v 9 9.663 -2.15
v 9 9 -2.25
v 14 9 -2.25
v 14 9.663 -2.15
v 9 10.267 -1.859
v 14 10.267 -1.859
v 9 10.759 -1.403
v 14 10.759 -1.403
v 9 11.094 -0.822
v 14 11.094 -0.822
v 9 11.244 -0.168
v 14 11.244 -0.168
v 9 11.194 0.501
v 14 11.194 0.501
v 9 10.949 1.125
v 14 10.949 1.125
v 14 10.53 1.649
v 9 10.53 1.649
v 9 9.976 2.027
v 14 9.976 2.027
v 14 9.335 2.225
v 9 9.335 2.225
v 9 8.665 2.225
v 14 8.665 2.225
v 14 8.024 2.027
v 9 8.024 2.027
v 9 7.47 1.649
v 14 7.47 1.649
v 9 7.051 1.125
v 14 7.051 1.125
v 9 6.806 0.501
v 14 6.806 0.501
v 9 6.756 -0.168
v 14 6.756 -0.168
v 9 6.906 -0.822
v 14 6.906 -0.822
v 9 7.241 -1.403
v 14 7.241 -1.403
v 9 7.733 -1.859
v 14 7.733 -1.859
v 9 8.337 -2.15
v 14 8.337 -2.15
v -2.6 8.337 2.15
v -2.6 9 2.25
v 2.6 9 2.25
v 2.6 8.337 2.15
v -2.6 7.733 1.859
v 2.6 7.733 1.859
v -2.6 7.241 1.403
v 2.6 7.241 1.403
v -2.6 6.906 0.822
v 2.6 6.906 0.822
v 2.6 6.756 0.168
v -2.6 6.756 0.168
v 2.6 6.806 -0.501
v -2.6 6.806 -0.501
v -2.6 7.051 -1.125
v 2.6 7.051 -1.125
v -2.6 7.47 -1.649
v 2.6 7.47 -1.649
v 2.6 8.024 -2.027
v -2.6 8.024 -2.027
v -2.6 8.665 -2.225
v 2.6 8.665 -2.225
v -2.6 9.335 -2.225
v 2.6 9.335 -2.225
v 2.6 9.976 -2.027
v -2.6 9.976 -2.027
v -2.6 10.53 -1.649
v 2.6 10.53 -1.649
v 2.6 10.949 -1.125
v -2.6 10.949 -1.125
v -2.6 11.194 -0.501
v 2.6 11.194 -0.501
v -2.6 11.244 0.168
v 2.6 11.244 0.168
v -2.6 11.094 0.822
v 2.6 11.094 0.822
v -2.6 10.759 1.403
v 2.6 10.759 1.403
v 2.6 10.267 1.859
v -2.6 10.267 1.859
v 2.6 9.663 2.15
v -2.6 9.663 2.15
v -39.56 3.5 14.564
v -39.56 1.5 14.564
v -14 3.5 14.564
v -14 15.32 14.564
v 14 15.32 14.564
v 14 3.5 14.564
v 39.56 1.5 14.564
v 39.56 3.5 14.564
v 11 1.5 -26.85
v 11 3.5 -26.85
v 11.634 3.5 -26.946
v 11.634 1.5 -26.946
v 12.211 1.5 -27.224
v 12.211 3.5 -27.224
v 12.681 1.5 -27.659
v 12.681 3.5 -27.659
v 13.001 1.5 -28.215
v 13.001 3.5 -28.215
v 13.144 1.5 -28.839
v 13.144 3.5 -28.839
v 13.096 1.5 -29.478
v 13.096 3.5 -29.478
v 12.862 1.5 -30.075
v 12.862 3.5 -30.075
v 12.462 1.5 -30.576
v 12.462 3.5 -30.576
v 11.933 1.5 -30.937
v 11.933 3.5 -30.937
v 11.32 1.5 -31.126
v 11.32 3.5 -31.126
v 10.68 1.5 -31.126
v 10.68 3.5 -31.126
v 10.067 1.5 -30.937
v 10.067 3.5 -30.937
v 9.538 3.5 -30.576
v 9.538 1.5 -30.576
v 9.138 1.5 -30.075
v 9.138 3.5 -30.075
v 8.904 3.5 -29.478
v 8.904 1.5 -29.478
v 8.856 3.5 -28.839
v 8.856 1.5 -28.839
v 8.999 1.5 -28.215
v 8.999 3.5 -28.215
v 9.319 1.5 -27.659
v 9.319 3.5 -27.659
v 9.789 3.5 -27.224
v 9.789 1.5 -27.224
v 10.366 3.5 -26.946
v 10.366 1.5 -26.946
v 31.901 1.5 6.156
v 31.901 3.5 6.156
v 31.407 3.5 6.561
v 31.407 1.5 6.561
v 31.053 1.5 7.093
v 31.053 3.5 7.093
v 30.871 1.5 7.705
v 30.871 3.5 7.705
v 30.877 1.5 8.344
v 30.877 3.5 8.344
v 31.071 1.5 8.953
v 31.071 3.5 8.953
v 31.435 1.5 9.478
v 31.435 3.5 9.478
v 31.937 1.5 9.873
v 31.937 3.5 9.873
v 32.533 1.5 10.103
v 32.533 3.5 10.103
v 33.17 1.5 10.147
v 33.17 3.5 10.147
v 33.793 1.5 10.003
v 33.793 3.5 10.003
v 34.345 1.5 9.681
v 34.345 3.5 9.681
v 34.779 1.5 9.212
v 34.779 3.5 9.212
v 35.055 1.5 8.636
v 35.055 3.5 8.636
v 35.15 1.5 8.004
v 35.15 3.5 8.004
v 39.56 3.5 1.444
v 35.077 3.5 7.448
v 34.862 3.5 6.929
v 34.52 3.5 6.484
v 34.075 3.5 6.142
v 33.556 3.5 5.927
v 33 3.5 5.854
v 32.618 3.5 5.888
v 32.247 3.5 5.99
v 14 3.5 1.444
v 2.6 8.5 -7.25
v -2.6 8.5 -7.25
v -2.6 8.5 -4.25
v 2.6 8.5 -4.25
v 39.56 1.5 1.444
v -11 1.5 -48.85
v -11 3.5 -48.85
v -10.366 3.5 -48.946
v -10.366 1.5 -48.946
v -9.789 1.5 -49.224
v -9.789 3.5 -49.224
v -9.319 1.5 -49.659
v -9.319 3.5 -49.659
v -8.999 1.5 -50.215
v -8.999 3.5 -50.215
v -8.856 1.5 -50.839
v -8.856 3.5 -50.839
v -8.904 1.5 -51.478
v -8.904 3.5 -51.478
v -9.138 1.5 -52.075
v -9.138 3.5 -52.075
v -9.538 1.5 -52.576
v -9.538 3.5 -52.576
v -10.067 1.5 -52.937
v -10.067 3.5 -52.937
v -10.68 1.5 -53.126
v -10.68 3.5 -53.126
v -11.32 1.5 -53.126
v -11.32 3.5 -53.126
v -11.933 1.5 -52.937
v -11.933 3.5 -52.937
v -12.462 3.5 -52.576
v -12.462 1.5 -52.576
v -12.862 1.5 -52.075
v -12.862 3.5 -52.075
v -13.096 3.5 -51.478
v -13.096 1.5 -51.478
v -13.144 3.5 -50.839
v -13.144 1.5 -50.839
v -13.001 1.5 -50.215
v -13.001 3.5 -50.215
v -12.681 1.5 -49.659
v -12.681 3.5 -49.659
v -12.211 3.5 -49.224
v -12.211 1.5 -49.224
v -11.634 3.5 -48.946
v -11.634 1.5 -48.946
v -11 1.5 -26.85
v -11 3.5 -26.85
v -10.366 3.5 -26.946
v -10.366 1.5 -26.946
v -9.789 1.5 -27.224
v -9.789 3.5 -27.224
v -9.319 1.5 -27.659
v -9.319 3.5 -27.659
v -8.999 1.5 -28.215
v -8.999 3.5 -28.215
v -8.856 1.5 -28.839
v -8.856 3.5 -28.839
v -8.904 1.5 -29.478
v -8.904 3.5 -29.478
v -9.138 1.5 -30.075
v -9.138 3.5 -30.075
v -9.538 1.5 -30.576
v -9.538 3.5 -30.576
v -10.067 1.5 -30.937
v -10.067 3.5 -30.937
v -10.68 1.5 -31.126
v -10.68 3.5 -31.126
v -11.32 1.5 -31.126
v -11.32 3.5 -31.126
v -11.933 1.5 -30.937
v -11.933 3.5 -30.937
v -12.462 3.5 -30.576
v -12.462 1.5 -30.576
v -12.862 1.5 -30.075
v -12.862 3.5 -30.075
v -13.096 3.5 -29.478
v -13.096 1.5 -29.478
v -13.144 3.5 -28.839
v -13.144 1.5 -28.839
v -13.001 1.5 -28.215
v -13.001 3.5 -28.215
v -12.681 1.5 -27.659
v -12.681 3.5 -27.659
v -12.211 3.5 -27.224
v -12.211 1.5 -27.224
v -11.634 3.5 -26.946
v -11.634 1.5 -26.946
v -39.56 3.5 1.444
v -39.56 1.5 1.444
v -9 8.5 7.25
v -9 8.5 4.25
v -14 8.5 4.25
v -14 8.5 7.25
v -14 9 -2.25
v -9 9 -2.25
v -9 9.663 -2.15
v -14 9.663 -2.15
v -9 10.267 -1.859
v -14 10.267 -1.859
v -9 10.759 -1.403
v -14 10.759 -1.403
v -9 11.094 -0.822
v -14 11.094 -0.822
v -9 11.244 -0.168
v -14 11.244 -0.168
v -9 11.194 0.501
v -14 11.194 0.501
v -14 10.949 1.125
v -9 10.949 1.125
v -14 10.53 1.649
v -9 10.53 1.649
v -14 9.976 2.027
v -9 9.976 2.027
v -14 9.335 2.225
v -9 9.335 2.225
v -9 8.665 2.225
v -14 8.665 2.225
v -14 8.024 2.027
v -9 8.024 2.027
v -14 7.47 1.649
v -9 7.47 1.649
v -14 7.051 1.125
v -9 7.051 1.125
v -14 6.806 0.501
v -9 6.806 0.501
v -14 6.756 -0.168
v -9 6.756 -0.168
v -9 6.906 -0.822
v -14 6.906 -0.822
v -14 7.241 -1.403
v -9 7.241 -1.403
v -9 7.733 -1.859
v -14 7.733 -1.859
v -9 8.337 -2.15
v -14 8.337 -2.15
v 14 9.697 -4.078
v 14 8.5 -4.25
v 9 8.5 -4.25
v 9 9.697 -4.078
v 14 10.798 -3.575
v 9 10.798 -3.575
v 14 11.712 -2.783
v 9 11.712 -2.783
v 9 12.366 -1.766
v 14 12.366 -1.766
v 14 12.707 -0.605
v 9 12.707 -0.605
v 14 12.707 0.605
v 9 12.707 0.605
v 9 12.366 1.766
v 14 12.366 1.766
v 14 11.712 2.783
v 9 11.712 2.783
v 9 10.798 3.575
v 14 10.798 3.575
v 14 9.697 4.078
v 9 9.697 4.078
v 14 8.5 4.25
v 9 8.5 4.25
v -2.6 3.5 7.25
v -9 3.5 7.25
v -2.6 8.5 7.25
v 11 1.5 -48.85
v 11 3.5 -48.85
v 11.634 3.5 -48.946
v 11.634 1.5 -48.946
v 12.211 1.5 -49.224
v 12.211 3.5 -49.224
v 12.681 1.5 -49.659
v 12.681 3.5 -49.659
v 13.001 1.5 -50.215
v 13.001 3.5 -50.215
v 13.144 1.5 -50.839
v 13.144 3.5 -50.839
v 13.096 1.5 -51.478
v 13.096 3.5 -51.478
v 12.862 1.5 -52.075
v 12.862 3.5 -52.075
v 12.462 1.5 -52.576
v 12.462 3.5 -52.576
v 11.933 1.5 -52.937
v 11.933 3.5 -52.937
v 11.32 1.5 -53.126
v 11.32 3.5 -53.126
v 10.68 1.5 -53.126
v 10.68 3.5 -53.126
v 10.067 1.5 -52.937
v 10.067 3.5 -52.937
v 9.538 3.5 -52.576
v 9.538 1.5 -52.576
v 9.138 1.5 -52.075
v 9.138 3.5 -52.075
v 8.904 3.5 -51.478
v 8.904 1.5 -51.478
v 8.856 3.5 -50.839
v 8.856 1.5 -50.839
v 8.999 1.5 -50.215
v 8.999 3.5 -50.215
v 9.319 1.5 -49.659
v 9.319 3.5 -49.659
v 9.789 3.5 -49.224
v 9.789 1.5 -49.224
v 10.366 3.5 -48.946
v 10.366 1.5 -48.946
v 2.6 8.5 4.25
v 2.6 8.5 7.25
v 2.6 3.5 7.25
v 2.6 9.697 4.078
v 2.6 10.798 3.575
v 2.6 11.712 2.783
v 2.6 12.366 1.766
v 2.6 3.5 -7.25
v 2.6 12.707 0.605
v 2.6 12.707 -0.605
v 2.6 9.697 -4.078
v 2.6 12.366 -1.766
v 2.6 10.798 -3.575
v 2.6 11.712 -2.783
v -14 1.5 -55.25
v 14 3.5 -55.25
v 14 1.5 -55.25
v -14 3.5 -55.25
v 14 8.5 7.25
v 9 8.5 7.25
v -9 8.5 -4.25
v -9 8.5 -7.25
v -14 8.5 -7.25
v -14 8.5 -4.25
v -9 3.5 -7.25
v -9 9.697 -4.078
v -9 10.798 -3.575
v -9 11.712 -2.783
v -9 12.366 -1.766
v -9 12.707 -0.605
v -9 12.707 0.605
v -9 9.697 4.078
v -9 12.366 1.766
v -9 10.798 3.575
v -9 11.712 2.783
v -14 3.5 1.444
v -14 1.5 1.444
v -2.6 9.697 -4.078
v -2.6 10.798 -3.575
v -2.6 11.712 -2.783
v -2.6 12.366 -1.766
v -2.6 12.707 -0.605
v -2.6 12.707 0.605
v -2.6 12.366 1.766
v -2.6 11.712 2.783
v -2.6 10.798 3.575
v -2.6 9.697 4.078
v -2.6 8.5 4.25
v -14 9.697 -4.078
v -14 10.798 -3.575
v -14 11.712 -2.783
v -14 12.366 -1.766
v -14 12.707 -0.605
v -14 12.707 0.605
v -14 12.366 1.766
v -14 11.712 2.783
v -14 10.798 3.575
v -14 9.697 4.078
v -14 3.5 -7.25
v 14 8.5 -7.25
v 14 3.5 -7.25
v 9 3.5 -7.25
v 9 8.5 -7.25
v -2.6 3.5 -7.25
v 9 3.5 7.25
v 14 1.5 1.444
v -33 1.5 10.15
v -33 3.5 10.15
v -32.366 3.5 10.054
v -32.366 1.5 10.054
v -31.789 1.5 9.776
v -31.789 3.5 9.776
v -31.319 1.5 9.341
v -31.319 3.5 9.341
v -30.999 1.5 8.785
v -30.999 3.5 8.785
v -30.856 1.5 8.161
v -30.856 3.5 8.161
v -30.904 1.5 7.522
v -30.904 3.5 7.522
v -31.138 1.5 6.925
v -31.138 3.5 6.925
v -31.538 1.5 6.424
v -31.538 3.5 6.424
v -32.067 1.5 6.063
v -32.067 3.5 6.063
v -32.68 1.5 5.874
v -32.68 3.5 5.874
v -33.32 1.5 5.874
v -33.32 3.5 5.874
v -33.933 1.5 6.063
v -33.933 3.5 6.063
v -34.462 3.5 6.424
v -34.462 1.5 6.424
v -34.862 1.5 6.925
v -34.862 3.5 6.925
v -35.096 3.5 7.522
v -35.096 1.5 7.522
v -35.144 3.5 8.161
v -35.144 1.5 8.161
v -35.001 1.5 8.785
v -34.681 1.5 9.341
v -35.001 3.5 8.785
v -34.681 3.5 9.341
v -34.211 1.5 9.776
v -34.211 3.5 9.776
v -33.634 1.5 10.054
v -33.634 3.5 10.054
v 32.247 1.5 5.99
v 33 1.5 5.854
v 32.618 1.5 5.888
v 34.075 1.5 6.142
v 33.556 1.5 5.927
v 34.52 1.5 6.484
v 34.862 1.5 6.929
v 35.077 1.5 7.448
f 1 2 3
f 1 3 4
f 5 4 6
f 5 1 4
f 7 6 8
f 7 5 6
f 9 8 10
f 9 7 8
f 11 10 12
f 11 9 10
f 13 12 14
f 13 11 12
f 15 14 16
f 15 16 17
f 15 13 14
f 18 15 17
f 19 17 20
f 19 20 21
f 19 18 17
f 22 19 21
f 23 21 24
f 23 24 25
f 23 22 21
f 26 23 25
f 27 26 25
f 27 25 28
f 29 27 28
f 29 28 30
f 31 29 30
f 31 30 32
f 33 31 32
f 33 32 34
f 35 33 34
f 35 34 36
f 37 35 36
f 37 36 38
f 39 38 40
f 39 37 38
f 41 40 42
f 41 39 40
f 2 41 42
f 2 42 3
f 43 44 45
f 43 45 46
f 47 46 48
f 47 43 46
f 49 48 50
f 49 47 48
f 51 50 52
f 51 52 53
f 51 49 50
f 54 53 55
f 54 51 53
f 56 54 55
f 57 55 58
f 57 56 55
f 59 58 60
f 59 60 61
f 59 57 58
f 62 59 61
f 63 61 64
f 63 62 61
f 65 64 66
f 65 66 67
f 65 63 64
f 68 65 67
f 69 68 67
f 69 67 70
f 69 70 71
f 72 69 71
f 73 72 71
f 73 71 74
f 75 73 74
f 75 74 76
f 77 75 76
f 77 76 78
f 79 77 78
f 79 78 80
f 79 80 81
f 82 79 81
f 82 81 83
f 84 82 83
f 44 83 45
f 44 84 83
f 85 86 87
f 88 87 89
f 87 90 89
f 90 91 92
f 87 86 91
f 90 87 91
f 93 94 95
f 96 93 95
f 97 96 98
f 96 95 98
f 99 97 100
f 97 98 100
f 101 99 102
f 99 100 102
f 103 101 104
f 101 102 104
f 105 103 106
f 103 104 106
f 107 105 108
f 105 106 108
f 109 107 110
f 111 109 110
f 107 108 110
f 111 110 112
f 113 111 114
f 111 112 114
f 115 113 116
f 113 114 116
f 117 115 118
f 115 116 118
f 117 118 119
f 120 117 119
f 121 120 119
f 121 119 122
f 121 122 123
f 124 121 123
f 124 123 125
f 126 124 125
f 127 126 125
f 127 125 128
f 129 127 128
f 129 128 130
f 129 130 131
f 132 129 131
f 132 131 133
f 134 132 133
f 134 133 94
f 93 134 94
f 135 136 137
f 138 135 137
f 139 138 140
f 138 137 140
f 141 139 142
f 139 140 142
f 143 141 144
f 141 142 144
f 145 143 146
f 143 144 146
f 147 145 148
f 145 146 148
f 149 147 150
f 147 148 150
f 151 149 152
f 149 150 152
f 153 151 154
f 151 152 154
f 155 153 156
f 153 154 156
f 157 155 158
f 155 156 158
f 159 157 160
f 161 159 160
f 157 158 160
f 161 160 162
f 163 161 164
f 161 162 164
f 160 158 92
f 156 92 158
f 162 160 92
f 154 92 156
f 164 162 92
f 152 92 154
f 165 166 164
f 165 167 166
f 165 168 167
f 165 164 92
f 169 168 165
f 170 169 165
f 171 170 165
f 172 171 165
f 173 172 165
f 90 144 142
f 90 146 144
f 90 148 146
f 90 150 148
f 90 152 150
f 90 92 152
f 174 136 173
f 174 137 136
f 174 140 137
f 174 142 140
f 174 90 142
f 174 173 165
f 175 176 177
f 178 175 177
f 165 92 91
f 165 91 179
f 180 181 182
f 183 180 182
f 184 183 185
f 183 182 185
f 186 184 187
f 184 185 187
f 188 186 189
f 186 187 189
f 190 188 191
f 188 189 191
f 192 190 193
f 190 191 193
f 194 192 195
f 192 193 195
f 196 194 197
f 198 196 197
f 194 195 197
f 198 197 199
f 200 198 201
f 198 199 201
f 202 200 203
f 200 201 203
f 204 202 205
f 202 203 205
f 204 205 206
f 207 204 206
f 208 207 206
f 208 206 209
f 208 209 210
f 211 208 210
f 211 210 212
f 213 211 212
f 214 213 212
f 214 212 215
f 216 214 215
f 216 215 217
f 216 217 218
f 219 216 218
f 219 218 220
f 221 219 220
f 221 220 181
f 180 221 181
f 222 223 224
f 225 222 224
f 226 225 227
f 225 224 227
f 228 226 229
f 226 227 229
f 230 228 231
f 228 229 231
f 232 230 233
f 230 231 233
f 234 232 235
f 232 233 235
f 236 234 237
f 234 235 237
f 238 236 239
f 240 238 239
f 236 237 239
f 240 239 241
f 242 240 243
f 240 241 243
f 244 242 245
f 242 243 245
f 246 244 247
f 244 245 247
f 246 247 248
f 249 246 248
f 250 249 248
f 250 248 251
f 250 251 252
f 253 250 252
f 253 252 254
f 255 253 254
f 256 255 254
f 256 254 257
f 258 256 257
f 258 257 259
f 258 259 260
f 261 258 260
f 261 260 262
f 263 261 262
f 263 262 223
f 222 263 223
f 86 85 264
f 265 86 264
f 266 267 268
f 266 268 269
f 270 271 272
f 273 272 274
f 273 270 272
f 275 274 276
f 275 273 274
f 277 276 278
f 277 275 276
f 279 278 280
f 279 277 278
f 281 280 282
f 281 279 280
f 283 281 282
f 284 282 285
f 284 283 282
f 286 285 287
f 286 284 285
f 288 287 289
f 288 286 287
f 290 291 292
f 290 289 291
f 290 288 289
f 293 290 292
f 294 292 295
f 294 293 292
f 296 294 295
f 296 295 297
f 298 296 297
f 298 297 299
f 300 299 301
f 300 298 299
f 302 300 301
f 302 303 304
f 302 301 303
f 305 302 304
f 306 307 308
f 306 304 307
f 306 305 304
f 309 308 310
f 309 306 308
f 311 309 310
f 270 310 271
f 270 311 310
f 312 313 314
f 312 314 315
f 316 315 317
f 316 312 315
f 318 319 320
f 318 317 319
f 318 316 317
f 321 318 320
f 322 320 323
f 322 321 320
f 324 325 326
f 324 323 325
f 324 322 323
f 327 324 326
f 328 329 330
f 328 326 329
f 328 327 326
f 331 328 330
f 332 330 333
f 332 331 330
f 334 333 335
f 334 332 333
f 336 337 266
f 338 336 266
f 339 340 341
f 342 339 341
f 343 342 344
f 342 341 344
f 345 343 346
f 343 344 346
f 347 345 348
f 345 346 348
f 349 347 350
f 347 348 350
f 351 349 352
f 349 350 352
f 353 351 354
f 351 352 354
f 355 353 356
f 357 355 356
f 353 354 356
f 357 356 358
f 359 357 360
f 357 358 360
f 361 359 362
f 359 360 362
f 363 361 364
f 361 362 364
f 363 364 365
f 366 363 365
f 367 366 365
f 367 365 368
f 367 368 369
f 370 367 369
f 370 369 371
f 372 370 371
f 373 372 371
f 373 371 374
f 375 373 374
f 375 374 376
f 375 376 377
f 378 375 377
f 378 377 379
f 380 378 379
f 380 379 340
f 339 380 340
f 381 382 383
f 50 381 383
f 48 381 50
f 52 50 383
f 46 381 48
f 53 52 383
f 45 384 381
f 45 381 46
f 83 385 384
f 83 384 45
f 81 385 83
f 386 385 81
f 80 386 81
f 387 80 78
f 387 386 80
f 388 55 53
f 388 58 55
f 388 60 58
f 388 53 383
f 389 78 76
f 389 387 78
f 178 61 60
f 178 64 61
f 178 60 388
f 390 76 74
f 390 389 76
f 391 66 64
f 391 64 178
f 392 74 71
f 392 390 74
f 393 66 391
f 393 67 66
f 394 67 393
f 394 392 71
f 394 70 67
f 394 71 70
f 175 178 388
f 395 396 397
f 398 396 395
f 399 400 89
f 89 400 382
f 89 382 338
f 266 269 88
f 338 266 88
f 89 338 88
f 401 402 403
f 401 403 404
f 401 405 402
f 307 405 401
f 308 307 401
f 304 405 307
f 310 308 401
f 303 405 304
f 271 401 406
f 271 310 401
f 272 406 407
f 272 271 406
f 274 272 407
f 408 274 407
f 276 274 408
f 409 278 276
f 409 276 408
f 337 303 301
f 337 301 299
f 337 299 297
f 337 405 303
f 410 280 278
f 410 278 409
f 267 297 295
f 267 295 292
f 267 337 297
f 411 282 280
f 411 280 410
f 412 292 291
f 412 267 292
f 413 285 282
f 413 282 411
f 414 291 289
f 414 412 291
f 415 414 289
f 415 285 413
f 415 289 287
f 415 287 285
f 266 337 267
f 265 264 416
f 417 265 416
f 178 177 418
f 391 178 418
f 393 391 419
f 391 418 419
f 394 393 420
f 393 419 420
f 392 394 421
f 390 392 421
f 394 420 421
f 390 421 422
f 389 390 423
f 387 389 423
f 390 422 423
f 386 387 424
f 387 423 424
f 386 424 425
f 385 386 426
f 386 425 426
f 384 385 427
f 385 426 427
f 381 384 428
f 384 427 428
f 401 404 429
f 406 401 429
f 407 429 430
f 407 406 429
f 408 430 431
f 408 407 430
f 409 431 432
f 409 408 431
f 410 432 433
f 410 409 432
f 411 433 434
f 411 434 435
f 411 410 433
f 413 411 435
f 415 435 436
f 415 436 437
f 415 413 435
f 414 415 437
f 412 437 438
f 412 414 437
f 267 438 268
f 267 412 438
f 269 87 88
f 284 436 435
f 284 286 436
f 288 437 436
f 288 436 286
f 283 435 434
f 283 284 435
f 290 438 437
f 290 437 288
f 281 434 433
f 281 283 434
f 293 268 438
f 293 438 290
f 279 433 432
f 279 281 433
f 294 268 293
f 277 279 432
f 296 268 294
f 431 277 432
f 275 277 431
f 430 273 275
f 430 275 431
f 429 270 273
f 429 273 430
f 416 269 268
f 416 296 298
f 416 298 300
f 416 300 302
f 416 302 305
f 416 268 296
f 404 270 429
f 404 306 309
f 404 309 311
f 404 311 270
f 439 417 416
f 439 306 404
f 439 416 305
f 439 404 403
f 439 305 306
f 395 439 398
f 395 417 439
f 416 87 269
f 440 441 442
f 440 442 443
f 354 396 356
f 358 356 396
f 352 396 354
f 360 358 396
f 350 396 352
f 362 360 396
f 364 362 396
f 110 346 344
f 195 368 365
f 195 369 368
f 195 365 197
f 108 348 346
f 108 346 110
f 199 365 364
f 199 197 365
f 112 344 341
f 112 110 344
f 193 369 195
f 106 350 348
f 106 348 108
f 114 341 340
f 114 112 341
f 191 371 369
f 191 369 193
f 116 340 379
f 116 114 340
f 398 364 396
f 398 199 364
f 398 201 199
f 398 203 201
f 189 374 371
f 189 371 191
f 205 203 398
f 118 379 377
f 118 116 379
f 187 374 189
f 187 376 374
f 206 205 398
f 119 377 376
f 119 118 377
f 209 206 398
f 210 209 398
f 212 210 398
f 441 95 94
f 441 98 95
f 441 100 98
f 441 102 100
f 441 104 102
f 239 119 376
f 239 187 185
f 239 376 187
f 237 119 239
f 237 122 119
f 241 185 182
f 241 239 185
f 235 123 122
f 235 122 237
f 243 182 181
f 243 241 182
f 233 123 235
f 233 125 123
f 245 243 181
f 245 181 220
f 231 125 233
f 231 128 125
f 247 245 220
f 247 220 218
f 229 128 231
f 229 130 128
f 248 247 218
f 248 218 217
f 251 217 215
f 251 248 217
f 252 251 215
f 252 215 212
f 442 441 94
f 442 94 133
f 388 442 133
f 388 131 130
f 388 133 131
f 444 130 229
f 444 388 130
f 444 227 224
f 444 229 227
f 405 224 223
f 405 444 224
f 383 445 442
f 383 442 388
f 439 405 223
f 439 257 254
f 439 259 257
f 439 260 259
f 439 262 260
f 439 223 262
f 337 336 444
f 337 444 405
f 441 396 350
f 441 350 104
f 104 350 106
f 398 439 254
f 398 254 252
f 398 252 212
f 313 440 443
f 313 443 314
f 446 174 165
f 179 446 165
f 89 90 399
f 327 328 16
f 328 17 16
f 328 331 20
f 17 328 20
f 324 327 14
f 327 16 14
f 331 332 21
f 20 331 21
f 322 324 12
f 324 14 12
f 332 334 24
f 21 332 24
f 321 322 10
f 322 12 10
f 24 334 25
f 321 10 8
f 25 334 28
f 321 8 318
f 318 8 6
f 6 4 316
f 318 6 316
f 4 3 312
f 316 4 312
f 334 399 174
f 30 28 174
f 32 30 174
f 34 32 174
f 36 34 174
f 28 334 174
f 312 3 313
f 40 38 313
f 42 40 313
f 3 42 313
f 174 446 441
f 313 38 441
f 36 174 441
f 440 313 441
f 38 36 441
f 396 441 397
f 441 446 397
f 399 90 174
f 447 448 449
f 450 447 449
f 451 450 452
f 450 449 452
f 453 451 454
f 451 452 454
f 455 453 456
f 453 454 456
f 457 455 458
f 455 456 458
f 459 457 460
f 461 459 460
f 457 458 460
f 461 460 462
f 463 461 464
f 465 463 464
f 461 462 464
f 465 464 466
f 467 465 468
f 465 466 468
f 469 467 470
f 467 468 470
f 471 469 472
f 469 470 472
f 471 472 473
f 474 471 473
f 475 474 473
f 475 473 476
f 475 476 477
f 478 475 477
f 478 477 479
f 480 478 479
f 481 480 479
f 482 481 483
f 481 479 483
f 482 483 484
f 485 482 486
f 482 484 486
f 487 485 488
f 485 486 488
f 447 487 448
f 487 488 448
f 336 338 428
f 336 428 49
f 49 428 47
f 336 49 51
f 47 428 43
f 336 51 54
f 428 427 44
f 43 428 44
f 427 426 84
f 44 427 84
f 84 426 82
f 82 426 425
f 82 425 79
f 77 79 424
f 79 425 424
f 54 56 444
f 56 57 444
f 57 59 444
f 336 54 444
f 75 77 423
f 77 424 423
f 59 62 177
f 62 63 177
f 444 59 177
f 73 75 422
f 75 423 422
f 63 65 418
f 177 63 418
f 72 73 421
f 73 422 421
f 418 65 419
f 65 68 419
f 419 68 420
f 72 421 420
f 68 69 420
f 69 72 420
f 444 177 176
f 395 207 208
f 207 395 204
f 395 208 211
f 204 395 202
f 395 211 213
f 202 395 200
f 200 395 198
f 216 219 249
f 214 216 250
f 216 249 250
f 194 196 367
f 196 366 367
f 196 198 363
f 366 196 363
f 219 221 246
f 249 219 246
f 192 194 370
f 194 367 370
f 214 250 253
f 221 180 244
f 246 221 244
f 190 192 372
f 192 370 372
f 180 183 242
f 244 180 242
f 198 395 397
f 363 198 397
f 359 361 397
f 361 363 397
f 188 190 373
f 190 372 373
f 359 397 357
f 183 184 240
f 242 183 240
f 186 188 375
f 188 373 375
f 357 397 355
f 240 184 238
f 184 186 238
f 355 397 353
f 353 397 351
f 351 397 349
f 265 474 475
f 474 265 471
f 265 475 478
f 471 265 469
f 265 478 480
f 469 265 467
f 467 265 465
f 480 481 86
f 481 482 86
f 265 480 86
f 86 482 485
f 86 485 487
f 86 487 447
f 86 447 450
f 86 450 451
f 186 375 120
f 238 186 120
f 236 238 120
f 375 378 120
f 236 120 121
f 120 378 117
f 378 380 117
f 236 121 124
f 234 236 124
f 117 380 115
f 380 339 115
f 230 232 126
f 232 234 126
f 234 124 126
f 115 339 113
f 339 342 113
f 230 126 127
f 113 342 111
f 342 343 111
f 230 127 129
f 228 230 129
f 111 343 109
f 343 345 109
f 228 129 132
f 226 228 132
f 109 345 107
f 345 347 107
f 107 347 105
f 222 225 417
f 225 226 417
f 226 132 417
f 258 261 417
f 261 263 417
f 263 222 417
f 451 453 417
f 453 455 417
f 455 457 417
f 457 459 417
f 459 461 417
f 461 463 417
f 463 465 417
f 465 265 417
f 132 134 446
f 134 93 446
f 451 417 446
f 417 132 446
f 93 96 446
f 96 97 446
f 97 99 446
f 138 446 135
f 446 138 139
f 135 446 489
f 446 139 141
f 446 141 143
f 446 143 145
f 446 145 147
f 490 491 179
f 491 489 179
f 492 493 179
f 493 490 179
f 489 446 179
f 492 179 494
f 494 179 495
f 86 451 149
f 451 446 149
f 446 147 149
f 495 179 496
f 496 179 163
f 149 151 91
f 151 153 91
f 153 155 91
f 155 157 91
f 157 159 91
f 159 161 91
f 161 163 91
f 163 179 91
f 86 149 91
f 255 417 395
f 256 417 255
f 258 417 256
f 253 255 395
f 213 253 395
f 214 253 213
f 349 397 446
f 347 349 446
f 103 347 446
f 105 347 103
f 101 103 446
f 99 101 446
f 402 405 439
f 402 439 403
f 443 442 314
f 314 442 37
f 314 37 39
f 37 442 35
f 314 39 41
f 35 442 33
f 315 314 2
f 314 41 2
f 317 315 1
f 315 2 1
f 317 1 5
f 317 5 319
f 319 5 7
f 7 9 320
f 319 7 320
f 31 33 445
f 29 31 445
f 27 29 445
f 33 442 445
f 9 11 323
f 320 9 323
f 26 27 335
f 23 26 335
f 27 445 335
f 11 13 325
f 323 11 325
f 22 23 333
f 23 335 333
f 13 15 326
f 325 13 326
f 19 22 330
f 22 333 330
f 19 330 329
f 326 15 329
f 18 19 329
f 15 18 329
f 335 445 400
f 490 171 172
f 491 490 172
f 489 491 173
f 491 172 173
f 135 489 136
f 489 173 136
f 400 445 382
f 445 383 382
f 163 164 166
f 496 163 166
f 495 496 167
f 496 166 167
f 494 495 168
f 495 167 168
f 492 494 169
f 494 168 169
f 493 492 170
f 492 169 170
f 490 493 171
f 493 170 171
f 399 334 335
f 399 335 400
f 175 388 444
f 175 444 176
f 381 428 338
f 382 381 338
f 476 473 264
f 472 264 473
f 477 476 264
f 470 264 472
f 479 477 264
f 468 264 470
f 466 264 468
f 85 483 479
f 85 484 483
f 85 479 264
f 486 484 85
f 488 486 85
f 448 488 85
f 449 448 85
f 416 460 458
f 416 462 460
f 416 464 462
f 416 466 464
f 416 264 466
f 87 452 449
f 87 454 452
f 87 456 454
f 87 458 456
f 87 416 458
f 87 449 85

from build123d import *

# Parameters (mm, degrees)
SKETCH1_R                       = 2.25
BOSS_EXTRUDE1_DEPTH             = 14
SKETCH2_W                       = 18
SKETCH2_H                       = 9.25
CUT_EXTRUDE1_DEPTH              = 24.849790355
BOSS_EXTRUDE2_DEPTH             = 2.6
BOSS_EXTRUDE2_DEPTH_BACK        = 2.6
SKETCH4_R                       = 2.25
BOSS_EXTRUDE3_DEPTH             = 28
SKETCH7_W                       = 4.5
SKETCH7_H                       = 3
CUT_EXTRUDE2_DEPTH              = 36.082738034
SKETCH9_W                       = 28
SKETCH9_H                       = 2
BOSS_EXTRUDE4_DEPTH             = 48
BOSS_EXTRUDE5_REACH             = 60.209
SKETCH11_W                      = 28
SKETCH11_H                      = 7.313537016
BOSS_EXTRUDE5_DIRECTION_2_REACH = 60.209
SKETCH14_R                      = 2.15
CUT_EXTRUDE6_DEPTH              = 59.208886884
SKETCH15_W                      = 21.813537016
SKETCH15_H                      = 2
BOSS_EXTRUDE6_DEPTH             = 30
CUT_EXTRUDE7_DEPTH              = 2
SKETCH17_W                      = 21.813537016
SKETCH17_H                      = 2
BOSS_EXTRUDE7_DEPTH             = 30
SKETCH19_R                      = 2.15
CUT_EXTRUDE8_DEPTH              = 2
SKETCH20_W                      = 4.44
SKETCH20_H                      = 13.119449404
SKETCH20_W_2                    = 30
SKETCH20_H_2                    = 8.694087612
CUT_EXTRUDE9_DEPTH              = 2


with BuildPart() as part:
    # Sketch1 → Boss-Extrude1 (new, symmetric)
    with BuildSketch(Plane(origin=(0, 0, 0), x_dir=(0, 0, -1), z_dir=(1, 0, 0))):
        with BuildLine():
            Line((2.25, 1.5), (7.25, 1.5))
            Line((7.25, 1.5), (7.25, 8.5))
            Line((7.25, 8.5), (4.25, 8.5))
            ThreePointArc((4.25, 8.5), (0, 12.75), (-4.25, 8.5))
            Line((-4.25, 8.5), (-7.25, 8.5))
            Line((-7.25, 8.5), (-7.25, 1.5))
            Line((-7.25, 1.5), (-2.25, 1.5))
            Line((-2.25, 1.5), (-2.25, -1.5))
            Line((-2.25, -1.5), (2.25, -1.5))
            Line((2.25, -1.5), (2.25, 1.5))
        make_face()
        with Locations((0, 9)):
            Circle(SKETCH1_R, mode=Mode.SUBTRACT)
    extrude(amount=BOSS_EXTRUDE1_DEPTH, both=True)

    # Sketch2 → Cut-Extrude1 (cut, through all)
    with BuildSketch(Plane.XY.offset(7.25)):
        with Locations((0, 8.125)):
            Rectangle(SKETCH2_W, SKETCH2_H)
    extrude(amount=-CUT_EXTRUDE1_DEPTH, mode=Mode.SUBTRACT)

    # Sketch4 → Boss-Extrude2 (add, two sides: drawn at the far end of the back side and taken through both)
    with BuildSketch(Plane(origin=(0, 0, 0), x_dir=(0, 0, -1), z_dir=(1, 0, 0)).offset(-BOSS_EXTRUDE2_DEPTH_BACK)):
        with BuildLine():
            Line((-4.25, 8.5), (-7.25, 8.5))
            Line((-7.25, 8.5), (-7.25, 3.5))
            Line((-7.25, 3.5), (7.25, 3.5))
            Line((7.25, 3.5), (7.25, 8.5))
            Line((7.25, 8.5), (4.25, 8.5))
            ThreePointArc((4.25, 8.5), (0, 12.75), (-4.25, 8.5))
        make_face()
        with Locations(Location((0, 9, 0), (0, 0, 180))):
            Circle(SKETCH4_R, mode=Mode.SUBTRACT)
    extrude(amount=BOSS_EXTRUDE2_DEPTH + BOSS_EXTRUDE2_DEPTH_BACK)

    # Sketch6 → Boss-Extrude3 (add, through all)
    with BuildSketch(Plane.ZY.offset(14)):
        Polygon((7.25, 8.5), (14.563537016, 15.319983601), (14.563537016, 8.319983601), (7.25, 1.5), align=None)
    extrude(amount=-BOSS_EXTRUDE3_DEPTH)

    # Sketch7 → Cut-Extrude2 (cut, through all)
    with BuildSketch(Plane.ZY.offset(14)):
        Rectangle(SKETCH7_W, SKETCH7_H)
    extrude(amount=-CUT_EXTRUDE2_DEPTH, mode=Mode.SUBTRACT)

    # Sketch9 → Boss-Extrude4 (add)
    with BuildSketch(Plane(origin=(0, 0, -7.25), x_dir=(-1, 0, 0), z_dir=(0, 0, -1))):
        with Locations((0, 2.5)):
            Rectangle(SKETCH9_W, SKETCH9_H)
    extrude(amount=BOSS_EXTRUDE4_DEPTH)

    # Boss-Extrude5: up to this face of the body (flat: up to its plane)
    boss_extrude5_end = Plane(part.part.faces().sort_by_distance((0, 1.5, -24))[0])
    # Sketch11 → Boss-Extrude5 (add, up to the picked face)
    with BuildSketch(Plane(origin=(0, 3.5, 0), x_dir=(1, 0, 0), z_dir=(0, 1, 0)), mode=Mode.PRIVATE) as boss_extrude5_sk1:
        with Locations((0, -10.906768508)):
            Rectangle(SKETCH11_W, SKETCH11_H)
    boss_extrude5_tool1 = split(extrude(boss_extrude5_sk1.sketch, amount=-BOSS_EXTRUDE5_REACH, mode=Mode.PRIVATE), bisect_by=boss_extrude5_end, keep=Keep.BOTH, mode=Mode.PRIVATE)
    add(boss_extrude5_tool1.solids().sort_by(Axis((0, 3.5, 10.906769), (0, -1, 0)))[0])

    # Boss-Extrude5 direction 2: up to this face of the body (flat: up to its plane)
    boss_extrude5_direction_2_end = Plane(part.part.faces().sort_by_distance((0, 4.9099918, 10.906768508))[0])
    # Sketch11 → Boss-Extrude5 direction 2 (add, up to the picked face)
    with BuildSketch(Plane(origin=(0, 3.5, 0), x_dir=(1, 0, 0), z_dir=(0, 1, 0)), mode=Mode.PRIVATE) as boss_extrude5_direction_2_sk1:
        with Locations((0, -10.906768508)):
            Rectangle(SKETCH11_W, SKETCH11_H)
    boss_extrude5_direction_2_tool1 = split(extrude(boss_extrude5_direction_2_sk1.sketch, amount=BOSS_EXTRUDE5_DIRECTION_2_REACH, mode=Mode.PRIVATE), bisect_by=boss_extrude5_direction_2_end, keep=Keep.BOTH, mode=Mode.PRIVATE)
    add(boss_extrude5_direction_2_tool1.solids().sort_by(Axis((0, 3.5, 10.906769), (0, 1, 0)))[0])

    # Sketch14 → Cut-Extrude6 (cut, through all)
    with BuildSketch(Plane(origin=(0, 3.5, 0), x_dir=(1, 0, 0), z_dir=(0, 1, 0))):
        with Locations(Location((11, 51, 0), (0, 0, 270))):
            Circle(SKETCH14_R)
        with Locations(Location((11, 29, 0), (0, 0, 270))):
            Circle(SKETCH14_R)
        with Locations(Location((-11, 29, 0), (0, 0, 270))):
            Circle(SKETCH14_R)
        with Locations(Location((-11, 51, 0), (0, 0, 270))):
            Circle(SKETCH14_R)
    extrude(amount=-CUT_EXTRUDE6_DEPTH, mode=Mode.SUBTRACT)

    # Sketch15 → Boss-Extrude6 (add)
    with BuildSketch(Plane(origin=(14, 0, 0), x_dir=(0, 0, -1), z_dir=(1, 0, 0))):
        with Locations((-3.656768508, 2.5)):
            Rectangle(SKETCH15_W, SKETCH15_H)
    extrude(amount=BOSS_EXTRUDE6_DEPTH)

    # Sketch16 → Cut-Extrude7 (cut)
    with BuildSketch(Plane(origin=(0, 3.5, 0), x_dir=(1, 0, 0), z_dir=(0, 1, 0))):
        with BuildLine():
            ThreePointArc((33, -5.854087612), (32.430271679, -5.930947569), (31.901277584, -6.156032133))
            Line((31.901277584, -6.156032133), (33, -8.004087612))
            Line((33, -8.004087612), (33, -5.854087612))
        make_face()
        with BuildLine():
            Line((33, -8.004087612), (31.901277584, -6.156032133))
            ThreePointArc((31.901277584, -6.156032133), (31.936927376, -9.872877755), (35.15, -8.004087612))
            ThreePointArc((35.15, -8.004087612), (34.52027958, -6.483808032), (33, -5.854087612))
            Line((33, -5.854087612), (33, -8.004087612))
        make_face()
    extrude(amount=-CUT_EXTRUDE7_DEPTH, mode=Mode.SUBTRACT)

    # Sketch17 → Boss-Extrude7 (add)
    with BuildSketch(Plane.ZY.offset(14)):
        with Locations((3.656768508, 2.5)):
            Rectangle(SKETCH17_W, SKETCH17_H)
    extrude(amount=BOSS_EXTRUDE7_DEPTH)

    # Sketch19 → Cut-Extrude8 (cut)
    with BuildSketch(Plane(origin=(0, 3.5, 0), x_dir=(1, 0, 0), z_dir=(0, 1, 0))):
        with Locations(Location((-33, -8, 0), (0, 0, 270))):
            Circle(SKETCH19_R)
    extrude(amount=-CUT_EXTRUDE8_DEPTH, mode=Mode.SUBTRACT)

    # Sketch20 → Cut-Extrude9 (cut)
    with BuildSketch(Plane(origin=(0, 3.5, 0), x_dir=(1, 0, 0), z_dir=(0, 1, 0))):
        Polygon((44, 7.25), (14, 7.25), (14, -1.444087612), (39.56, -1.444087612), (44, -1.444087612), align=None)
        with Locations((41.78, -8.003812314)):
            Rectangle(SKETCH20_W, SKETCH20_H)
        with Locations((-29, 2.902956194)):
            Rectangle(SKETCH20_W_2, SKETCH20_H_2)
        with Locations((-41.78, -8.003812314)):
            Rectangle(SKETCH20_W, SKETCH20_H)
    extrude(amount=-CUT_EXTRUDE9_DEPTH, mode=Mode.SUBTRACT)


solid = part.part
